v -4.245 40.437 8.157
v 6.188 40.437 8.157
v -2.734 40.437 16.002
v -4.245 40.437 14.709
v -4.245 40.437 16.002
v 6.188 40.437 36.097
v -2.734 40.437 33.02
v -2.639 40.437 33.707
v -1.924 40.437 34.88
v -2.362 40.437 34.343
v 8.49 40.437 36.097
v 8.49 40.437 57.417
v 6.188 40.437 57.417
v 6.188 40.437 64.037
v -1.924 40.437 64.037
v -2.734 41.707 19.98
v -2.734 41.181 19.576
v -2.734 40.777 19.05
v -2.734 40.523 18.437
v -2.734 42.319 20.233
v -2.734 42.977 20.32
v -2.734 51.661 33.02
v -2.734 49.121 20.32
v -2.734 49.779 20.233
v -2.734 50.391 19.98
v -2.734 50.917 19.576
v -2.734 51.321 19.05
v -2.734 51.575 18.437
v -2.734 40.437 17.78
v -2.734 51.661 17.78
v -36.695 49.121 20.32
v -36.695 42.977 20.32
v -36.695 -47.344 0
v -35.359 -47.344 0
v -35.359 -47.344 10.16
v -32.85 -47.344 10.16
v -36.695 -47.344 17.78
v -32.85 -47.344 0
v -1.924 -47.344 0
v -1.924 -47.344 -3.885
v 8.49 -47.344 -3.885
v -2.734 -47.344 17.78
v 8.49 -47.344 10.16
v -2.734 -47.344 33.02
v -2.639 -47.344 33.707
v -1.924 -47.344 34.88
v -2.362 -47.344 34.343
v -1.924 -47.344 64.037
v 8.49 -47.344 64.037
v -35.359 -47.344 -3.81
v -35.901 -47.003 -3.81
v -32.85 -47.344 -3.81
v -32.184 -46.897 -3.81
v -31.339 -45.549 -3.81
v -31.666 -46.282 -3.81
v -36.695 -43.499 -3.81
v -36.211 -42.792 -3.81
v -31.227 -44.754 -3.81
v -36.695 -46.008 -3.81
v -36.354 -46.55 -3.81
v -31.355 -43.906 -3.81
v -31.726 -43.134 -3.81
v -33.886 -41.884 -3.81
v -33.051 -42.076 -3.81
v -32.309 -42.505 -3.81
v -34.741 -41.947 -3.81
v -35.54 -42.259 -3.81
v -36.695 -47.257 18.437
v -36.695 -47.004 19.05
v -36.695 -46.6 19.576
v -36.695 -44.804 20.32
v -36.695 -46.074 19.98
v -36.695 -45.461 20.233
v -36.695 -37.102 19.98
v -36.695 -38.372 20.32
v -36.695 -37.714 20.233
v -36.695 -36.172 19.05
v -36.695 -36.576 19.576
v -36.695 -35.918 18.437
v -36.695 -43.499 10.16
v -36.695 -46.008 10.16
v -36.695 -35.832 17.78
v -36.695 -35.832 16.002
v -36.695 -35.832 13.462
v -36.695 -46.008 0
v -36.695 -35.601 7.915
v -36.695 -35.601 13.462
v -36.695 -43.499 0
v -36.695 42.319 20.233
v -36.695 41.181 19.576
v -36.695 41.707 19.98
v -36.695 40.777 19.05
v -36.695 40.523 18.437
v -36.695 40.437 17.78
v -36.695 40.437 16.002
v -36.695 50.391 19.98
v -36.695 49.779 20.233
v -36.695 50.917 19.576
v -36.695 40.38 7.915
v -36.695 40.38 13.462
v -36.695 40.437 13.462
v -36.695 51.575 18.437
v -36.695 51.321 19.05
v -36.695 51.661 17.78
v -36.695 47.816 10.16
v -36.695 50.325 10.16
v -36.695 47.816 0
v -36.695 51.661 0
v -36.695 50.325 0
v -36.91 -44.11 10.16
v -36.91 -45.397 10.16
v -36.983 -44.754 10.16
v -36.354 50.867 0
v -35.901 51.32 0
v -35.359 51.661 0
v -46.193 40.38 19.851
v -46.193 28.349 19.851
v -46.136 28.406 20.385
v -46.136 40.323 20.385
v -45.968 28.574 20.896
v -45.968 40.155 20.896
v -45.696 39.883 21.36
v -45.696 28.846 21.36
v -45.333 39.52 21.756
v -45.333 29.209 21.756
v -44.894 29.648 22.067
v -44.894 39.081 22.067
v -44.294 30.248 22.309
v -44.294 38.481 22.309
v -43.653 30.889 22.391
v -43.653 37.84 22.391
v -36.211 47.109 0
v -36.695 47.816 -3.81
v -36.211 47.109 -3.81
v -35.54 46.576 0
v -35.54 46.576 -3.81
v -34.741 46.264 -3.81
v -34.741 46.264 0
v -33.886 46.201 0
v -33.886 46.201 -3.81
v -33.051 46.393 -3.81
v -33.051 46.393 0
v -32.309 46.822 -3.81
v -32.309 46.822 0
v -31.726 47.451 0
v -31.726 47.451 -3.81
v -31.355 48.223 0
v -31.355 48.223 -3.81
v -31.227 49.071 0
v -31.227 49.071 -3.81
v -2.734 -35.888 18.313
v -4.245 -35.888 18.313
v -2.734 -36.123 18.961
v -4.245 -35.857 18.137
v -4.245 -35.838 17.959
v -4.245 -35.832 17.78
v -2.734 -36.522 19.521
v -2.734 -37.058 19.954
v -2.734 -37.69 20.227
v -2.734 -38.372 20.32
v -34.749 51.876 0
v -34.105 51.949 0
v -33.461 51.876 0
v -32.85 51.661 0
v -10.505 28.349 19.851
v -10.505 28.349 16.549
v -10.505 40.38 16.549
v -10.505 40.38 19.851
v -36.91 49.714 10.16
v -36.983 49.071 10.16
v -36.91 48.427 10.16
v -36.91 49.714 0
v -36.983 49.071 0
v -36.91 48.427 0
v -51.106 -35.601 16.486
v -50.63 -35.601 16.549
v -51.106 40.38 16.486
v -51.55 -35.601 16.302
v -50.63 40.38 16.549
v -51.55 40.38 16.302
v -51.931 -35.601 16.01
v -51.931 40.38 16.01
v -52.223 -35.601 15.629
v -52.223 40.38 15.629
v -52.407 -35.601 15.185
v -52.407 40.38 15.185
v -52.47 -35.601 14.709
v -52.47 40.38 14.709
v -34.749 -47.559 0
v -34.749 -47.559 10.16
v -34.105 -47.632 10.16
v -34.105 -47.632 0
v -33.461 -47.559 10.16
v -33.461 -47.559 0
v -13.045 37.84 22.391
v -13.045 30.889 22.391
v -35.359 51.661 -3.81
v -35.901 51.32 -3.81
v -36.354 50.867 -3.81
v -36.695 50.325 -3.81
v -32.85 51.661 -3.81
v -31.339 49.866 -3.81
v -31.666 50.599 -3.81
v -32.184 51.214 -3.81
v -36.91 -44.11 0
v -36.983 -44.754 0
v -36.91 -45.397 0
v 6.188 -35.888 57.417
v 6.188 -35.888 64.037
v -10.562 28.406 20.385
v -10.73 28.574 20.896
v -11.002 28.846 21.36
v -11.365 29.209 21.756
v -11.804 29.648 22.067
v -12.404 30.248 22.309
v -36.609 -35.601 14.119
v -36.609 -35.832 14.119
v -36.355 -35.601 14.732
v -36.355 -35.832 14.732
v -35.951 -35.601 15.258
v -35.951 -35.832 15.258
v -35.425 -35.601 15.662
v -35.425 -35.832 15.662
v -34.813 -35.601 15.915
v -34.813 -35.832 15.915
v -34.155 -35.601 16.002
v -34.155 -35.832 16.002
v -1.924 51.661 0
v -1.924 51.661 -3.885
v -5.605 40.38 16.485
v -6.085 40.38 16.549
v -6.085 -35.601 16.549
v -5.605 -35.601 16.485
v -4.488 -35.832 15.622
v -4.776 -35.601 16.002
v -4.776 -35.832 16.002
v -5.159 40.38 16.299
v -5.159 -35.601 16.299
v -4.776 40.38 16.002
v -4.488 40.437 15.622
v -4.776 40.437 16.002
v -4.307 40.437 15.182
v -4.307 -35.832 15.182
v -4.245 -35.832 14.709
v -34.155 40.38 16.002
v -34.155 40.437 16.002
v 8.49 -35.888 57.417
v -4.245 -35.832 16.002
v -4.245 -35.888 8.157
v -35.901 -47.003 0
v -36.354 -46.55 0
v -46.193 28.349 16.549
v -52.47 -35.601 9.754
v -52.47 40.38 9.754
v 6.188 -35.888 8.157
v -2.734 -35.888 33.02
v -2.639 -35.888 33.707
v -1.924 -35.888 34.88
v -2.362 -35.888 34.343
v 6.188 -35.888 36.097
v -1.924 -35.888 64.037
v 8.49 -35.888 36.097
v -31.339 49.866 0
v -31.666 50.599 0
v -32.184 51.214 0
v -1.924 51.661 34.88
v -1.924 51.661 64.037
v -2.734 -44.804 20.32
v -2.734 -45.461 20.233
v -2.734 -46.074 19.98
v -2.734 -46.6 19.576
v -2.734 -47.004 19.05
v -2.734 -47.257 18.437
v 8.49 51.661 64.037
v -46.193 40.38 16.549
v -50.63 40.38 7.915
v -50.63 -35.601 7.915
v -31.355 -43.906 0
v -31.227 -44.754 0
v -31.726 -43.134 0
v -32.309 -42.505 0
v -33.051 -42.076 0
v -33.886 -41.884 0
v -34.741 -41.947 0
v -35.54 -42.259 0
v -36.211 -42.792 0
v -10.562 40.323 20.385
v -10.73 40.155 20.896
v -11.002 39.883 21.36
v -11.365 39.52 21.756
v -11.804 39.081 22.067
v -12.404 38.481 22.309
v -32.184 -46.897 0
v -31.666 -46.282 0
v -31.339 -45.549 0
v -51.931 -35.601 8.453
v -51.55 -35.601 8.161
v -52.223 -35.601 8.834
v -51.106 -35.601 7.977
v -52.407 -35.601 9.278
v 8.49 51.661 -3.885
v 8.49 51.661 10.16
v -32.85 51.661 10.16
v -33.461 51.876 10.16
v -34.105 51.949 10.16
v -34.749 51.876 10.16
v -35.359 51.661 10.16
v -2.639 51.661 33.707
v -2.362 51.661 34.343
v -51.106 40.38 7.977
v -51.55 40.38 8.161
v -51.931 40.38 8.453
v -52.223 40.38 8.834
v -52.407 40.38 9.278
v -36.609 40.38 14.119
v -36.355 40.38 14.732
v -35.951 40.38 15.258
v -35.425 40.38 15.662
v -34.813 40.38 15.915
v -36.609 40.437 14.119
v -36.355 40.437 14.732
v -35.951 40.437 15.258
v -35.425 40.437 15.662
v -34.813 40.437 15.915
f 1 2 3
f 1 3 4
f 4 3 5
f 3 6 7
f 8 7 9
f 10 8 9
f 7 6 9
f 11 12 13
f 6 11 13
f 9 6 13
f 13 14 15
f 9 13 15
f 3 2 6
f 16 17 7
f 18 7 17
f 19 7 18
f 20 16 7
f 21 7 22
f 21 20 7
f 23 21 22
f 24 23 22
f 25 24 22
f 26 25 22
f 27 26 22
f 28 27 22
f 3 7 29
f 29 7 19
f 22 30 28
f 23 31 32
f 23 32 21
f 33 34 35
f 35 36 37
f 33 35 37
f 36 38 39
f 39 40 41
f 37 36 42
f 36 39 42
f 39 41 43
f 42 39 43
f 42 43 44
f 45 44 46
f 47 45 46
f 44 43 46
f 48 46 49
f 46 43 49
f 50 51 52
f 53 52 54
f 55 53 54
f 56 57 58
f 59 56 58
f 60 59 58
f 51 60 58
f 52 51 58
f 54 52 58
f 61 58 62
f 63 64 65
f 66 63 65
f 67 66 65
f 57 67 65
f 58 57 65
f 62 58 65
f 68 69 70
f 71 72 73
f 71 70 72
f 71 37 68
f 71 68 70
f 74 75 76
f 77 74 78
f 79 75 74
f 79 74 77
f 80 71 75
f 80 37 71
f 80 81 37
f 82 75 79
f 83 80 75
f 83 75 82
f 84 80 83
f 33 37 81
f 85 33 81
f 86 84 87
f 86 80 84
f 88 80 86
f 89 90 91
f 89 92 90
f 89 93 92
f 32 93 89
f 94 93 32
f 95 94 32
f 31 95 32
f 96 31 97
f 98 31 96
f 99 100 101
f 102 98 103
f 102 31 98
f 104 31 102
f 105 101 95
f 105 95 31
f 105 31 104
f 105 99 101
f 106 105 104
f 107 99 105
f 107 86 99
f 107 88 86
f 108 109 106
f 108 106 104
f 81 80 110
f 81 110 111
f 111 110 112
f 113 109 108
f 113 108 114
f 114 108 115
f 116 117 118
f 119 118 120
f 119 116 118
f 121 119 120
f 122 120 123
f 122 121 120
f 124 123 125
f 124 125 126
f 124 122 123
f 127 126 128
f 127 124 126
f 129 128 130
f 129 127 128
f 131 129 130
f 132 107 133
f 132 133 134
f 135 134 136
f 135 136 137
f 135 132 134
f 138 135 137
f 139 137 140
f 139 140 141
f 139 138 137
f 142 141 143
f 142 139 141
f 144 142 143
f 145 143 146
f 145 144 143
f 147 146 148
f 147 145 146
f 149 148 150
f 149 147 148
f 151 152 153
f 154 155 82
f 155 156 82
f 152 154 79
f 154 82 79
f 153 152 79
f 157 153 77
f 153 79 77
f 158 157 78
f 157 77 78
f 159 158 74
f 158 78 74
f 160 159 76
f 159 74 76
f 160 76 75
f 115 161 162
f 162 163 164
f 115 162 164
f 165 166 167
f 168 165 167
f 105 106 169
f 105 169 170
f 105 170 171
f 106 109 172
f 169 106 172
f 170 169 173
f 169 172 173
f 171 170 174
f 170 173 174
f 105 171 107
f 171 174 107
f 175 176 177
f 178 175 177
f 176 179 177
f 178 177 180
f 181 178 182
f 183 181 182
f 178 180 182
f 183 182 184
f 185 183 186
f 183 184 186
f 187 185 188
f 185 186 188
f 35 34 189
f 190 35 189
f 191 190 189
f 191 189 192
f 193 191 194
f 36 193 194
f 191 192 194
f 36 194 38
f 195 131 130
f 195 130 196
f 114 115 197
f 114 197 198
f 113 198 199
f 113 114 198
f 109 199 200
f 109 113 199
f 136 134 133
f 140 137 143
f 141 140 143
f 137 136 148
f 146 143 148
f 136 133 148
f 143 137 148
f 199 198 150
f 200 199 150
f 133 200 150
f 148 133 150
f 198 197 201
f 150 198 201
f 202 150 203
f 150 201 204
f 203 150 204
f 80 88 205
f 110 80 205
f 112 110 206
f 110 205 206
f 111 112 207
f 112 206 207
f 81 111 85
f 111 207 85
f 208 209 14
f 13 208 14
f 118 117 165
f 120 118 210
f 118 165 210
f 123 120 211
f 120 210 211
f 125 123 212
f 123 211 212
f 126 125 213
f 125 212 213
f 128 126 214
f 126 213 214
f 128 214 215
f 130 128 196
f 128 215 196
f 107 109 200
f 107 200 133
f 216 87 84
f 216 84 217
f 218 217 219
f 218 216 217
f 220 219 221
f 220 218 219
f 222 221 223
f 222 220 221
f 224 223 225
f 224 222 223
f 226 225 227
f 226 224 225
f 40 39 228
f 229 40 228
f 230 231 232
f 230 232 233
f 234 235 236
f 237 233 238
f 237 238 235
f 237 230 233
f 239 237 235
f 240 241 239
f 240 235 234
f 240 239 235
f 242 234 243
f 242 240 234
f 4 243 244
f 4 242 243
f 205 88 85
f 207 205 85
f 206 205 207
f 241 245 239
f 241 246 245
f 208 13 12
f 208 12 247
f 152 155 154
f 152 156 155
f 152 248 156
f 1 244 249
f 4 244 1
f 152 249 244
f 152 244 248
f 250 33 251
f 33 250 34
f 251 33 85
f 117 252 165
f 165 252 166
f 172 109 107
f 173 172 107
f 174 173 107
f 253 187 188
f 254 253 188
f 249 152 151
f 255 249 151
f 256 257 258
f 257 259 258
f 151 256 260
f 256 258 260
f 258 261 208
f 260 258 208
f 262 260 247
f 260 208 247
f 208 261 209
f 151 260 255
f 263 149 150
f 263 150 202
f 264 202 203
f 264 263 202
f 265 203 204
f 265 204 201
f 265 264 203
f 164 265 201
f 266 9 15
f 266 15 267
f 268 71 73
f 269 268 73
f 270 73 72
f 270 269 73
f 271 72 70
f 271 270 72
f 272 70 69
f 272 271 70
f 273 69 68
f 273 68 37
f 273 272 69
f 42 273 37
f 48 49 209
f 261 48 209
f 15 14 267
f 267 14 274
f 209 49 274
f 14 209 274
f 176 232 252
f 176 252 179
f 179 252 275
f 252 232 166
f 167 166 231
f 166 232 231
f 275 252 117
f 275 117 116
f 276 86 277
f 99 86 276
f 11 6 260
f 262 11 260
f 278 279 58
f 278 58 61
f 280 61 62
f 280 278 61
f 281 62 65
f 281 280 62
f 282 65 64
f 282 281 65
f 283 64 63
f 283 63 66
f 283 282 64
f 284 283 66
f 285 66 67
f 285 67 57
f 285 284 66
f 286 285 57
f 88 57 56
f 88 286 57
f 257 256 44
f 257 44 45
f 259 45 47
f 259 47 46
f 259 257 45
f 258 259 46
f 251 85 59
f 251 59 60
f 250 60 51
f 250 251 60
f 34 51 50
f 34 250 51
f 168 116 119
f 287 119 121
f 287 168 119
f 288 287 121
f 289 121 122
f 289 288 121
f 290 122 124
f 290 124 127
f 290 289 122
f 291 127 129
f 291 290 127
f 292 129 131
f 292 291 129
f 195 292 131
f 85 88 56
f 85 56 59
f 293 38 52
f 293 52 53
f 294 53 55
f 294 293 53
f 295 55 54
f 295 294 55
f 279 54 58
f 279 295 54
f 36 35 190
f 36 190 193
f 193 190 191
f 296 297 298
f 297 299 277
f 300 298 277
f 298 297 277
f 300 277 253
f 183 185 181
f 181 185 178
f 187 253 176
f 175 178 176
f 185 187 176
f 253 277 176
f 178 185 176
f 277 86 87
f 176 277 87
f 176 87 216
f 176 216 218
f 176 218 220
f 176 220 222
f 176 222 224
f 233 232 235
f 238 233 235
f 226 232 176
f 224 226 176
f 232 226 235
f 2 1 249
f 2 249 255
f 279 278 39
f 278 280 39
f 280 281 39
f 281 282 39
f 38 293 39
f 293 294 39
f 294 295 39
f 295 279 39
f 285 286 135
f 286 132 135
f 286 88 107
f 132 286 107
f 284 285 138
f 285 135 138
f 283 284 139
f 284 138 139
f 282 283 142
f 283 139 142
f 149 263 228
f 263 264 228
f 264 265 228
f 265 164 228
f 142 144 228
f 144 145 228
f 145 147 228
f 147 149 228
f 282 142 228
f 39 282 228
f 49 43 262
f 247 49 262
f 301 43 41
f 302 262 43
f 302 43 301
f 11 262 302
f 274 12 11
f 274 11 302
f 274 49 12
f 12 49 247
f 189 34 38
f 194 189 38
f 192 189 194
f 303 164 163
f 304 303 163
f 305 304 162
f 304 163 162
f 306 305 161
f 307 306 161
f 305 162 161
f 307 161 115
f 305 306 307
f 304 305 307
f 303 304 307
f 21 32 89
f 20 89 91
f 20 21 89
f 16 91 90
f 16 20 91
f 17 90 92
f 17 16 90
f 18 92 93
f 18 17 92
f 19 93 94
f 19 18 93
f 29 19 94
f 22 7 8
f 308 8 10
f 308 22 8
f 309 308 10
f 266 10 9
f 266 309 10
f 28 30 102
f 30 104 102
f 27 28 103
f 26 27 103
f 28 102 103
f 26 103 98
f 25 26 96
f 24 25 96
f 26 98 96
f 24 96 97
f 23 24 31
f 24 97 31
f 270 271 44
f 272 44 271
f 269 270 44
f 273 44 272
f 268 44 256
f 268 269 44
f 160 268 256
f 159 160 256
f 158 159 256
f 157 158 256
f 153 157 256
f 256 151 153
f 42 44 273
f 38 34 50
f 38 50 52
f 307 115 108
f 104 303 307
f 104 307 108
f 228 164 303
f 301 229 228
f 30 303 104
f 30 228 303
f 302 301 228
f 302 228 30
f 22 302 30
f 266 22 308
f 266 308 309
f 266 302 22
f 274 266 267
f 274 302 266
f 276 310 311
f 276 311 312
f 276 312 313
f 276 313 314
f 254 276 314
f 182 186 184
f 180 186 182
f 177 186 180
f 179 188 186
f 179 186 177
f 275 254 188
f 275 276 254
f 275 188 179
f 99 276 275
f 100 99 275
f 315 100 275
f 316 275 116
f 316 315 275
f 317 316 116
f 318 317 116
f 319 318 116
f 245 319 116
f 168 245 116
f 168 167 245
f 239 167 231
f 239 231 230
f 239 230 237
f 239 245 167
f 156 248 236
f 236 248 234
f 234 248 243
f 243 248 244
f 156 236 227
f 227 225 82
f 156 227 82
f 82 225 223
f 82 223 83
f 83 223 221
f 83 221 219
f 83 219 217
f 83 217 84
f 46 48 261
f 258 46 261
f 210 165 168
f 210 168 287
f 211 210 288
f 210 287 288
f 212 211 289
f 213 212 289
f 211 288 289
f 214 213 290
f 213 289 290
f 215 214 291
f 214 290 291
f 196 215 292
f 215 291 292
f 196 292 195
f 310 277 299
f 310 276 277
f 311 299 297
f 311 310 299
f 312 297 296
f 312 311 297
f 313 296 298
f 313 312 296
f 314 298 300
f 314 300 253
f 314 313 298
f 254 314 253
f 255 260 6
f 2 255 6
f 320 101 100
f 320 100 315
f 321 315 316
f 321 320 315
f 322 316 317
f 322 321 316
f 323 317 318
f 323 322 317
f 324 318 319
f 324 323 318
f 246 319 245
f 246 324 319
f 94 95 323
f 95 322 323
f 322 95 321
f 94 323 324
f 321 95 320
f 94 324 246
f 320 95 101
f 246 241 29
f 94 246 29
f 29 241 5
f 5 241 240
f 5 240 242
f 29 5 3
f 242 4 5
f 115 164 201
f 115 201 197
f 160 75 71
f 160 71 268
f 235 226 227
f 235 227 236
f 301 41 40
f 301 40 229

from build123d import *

# Parameters (mm, degrees)
F0_W         = 22.5927522406
F0_H         = 49.5025906712
F1_DEPTH     = 10.16
F2_DEPTH     = 3.81
F3_W         = 11.2244246993
F3_H         = 99.0051813424
F4_DEPTH     = 25.4
F6_DEPTH     = 10.16
F7_R         = 2.54
F8_W         = 33.9610797819
F8_H         = 38.1342638284
F8_H_2       = 37.1269418392
F9_DEPTH     = 5.842
F10_R        = 2.54
F11_W        = 99.0051813424
F11_H        = 67.9221570026
F11_W_2      = 75.9807229042
F11_H_2      = 8.63417238
F12_DEPTH    = 10.414
F13_W        = 19.139082171
F13_H        = 29.1566260799
F13_W_2      = 6.5123029053
F13_H_2      = 0.8140355349
F13_W_3      = 18.2694643736
F13_W_4      = 7.5298482552
F13_W_5      = 18.2365168585
F13_W_6      = 7.1228295565
F13_W_7      = 18.1018151343
F13_W_8      = 7.1228314191
F14_DEPTH    = 0.254
F15_DEPTH    = 1.524
F16_DEPTH    = 60.96
F17_W        = 8.1115535974
F17_H        = 76.3251371682
F17_W_2      = 2.3215521545
F18_DEPTH    = 55.88
F19_R        = 1.8396307345
F20_T4_DEPTH = 85.1788765768
F21_W        = 35.6879150495
F21_H        = 12.0312273502
F22_DEPTH    = 5.842
F23_R        = 2.54
F24_W        = 76.3251371682
F24_H        = 21.320472064
F25_DEPTH    = 25.4


# Not quite as in the source:
# - a fillet or chamfer that OpenCascade refuses, or shapes differently, is made with other operations: its cross-section is extruded or revolved along the edge and cut away or added
# - a feature names something its author has since deleted; it is built from what else it names


with BuildPart() as f1:
    # F0 (on Top) → F1 (new body)
    with BuildSketch(Plane.XY):
        with BuildLine():
            Line((-35.3594812499, 51.6611337662), (-36.6952344775, 51.6611337662))
            Line((-36.6952344775, 51.6611337662), (-36.6952344775, 50.3253805386))
            ThreePointArc((-36.6952344775, 50.3253805386), (-36.1400711383, 51.105970427), (-35.3594812499, 51.6611337662))
        make_face()
        with BuildLine():
            ThreePointArc((-32.8504798068, 51.6611337662), (-34.1049805284, 51.9489325583), (-35.3594812499, 51.6611337662))
            Line((-35.3594812499, 51.6611337662), (-32.8504798068, 51.6611337662))
        make_face()
        with BuildLine():
            Line((-32.8504798068, 51.6611337662), (-35.3594812499, 51.6611337662))
            ThreePointArc((-35.3594812499, 51.6611337662), (-36.1400711383, 51.105970427), (-36.6952344775, 50.3253805386))
            Line((-36.6952344775, 50.3253805386), (-36.6952344775, 47.8163790954))
            ThreePointArc((-36.6952344775, 47.8163790954), (-33.4614356183, 46.2656993361), (-31.2269277871, 49.070879817))
            ThreePointArc((-31.2269277871, 49.070879817), (-31.6663634179, 50.5993869876), (-32.8504798068, 51.6611337662))
        make_face()
        with BuildLine():
            Line((-36.6952344775, 47.8163790954), (-36.6952344775, 50.3253805386))
            ThreePointArc((-36.6952344775, 50.3253805386), (-36.9830332696, 49.070879817), (-36.6952344775, 47.8163790954))
        make_face()
        with BuildLine():
            Line((-14.1024822369, 51.6611337662), (-32.8504798068, 51.6611337662))
            ThreePointArc((-32.8504798068, 51.6611337662), (-31.6663634179, 50.5993869876), (-31.2269277871, 49.070879817))
            ThreePointArc((-31.2269277871, 49.070879817), (-33.4614356183, 46.2656993361), (-36.6952344775, 47.8163790954))
            Line((-36.6952344775, 47.8163790954), (-36.6952344775, 2.158543095))
            Line((-36.6952344775, 2.158543095), (-14.1024822369, 2.158543095))
            Line((-14.1024822369, 2.158543095), (-14.1024822369, 51.6611337662))
        make_face()
        with Locations((-2.8061061166, 26.9098384306)):
            Rectangle(F0_W, F0_H)
        with BuildLine():
            Line((-14.1024822369, 2.158543095), (-36.6952344775, 2.158543095))
            Line((-36.6952344775, 2.158543095), (-36.6952344775, -43.4992929054))
            ThreePointArc((-36.6952344775, -43.4992929054), (-33.4614356183, -41.9486131461), (-31.2269277871, -44.753793627))
            ThreePointArc((-31.2269277871, -44.753793627), (-31.6663634179, -46.2823007976), (-32.8504798068, -47.3440475762))
            Line((-32.8504798068, -47.3440475762), (-14.1024822369, -47.3440475762))
            Line((-14.1024822369, -47.3440475762), (-14.1024822369, 2.158543095))
        make_face()
        with Locations((-2.8061061166, -22.5927522406)):
            Rectangle(F0_W, F0_H)
        with BuildLine():
            ThreePointArc((-31.2269277871, -44.753793627), (-33.4614356183, -41.9486131461), (-36.6952344775, -43.4992929054))
            Line((-36.6952344775, -43.4992929054), (-36.6952344775, -46.0082943486))
            ThreePointArc((-36.6952344775, -46.0082943486), (-36.1400711383, -46.788884237), (-35.3594812499, -47.3440475762))
            Line((-35.3594812499, -47.3440475762), (-32.8504798068, -47.3440475762))
            ThreePointArc((-32.8504798068, -47.3440475762), (-31.6663634179, -46.2823007976), (-31.2269277871, -44.753793627))
        make_face()
        with BuildLine():
            Line((-36.6952344775, -46.0082943486), (-36.6952344775, -43.4992929054))
            ThreePointArc((-36.6952344775, -43.4992929054), (-36.9830332696, -44.753793627), (-36.6952344775, -46.0082943486))
        make_face()
        with BuildLine():
            ThreePointArc((-35.3594812499, -47.3440475762), (-36.1400711383, -46.788884237), (-36.6952344775, -46.0082943486))
            Line((-36.6952344775, -46.0082943486), (-36.6952344775, -47.3440475762))
            Line((-36.6952344775, -47.3440475762), (-35.3594812499, -47.3440475762))
        make_face()
        with BuildLine():
            ThreePointArc((-35.3594812499, -47.3440475762), (-34.1049805284, -47.6318463683), (-32.8504798068, -47.3440475762))
            Line((-32.8504798068, -47.3440475762), (-35.3594812499, -47.3440475762))
        make_face()
    extrude(amount=F1_DEPTH)

    # F0 (on Top) → F2 (join)
    with BuildSketch(Plane.XY):
        with BuildLine():
            Line((-32.8504798068, 51.6611337662), (-35.3594812499, 51.6611337662))
            ThreePointArc((-35.3594812499, 51.6611337662), (-36.1400711383, 51.105970427), (-36.6952344775, 50.3253805386))
            Line((-36.6952344775, 50.3253805386), (-36.6952344775, 47.8163790954))
            ThreePointArc((-36.6952344775, 47.8163790954), (-33.4614356183, 46.2656993361), (-31.2269277871, 49.070879817))
            ThreePointArc((-31.2269277871, 49.070879817), (-31.6663634179, 50.5993869876), (-32.8504798068, 51.6611337662))
        make_face()
        with BuildLine():
            ThreePointArc((-31.2269277871, -44.753793627), (-33.4614356183, -41.9486131461), (-36.6952344775, -43.4992929054))
            Line((-36.6952344775, -43.4992929054), (-36.6952344775, -46.0082943486))
            ThreePointArc((-36.6952344775, -46.0082943486), (-36.1400711383, -46.788884237), (-35.3594812499, -47.3440475762))
            Line((-35.3594812499, -47.3440475762), (-32.8504798068, -47.3440475762))
            ThreePointArc((-32.8504798068, -47.3440475762), (-31.6663634179, -46.2823007976), (-31.2269277871, -44.753793627))
        make_face()
    extrude(amount=-F2_DEPTH)

    # F3 (on face) → F4 (join)
    with BuildSketch(Plane.XY.offset(10.16)):
        with Locations((2.878057654, 2.158543095)):
            Rectangle(F3_W, F3_H)
    extrude(amount=F4_DEPTH)

    # F5 (on face) → F6 (join)
    with BuildSketch(Plane.XY.offset(10.16)):
        Polygon((-2.7341546956, 40.4367111623), (-2.7341546956, 51.6611337662), (-32.8504798068, 51.6611337662), (-35.3594812499, 51.6611337662), (-36.6952344775, 51.6611337662), (-36.6952344775, 50.3253805386), (-36.6952344775, 47.8163790954), (-36.6952344775, 40.4367111623), align=None)
        Polygon((-2.7341546956, -47.3440475762), (-2.7341546956, -35.8318164945), (-36.6952344775, -35.8318164945), (-36.6952344775, -43.4992929054), (-36.6952344775, -46.0082943486), (-36.6952344775, -47.3440475762), (-35.3594812499, -47.3440475762), (-32.8504798068, -47.3440475762), align=None)
    extrude(amount=F6_DEPTH)

    # F7
    f7_edges = [f1.edges().sort_by_distance(p)[0] for p in [
        (-2.734155, 2.158543, 35.56),
        (-19.714695, -35.831816, 20.32),
        (-19.714695, -47.344048, 20.32),
        (-19.714695, 51.661134, 20.32),
        (-19.714695, 40.436711, 20.32),
    ]]
    fillet(f7_edges, radius=F7_R)

    # F8 (on face) → F9 (join)
    with BuildSketch(Plane.XY.offset(10.16)):
        with Locations((-19.7146945866, 21.3695792481)):
            Rectangle(F8_W, F8_H)
        with Locations((-19.7146945866, -17.2683455748)):
            Rectangle(F8_W, F8_H_2)
    extrude(amount=F9_DEPTH)

    # F10
    f10_edges = [f1.edges().sort_by_distance(p)[0] for p in [
        (-19.714695, 1.295125, 16.002),
        (-19.714695, 2.302447, 16.002),
        (-36.695234, -17.268346, 16.002),
        (-36.695234, 21.369579, 16.002),
    ]]
    fillet(f10_edges, radius=F10_R)

    # F11 (on face) → F12 (join)
    with BuildSketch(Plane.YZ.offset(8.4902700037)):
        with Locations((2.158543095, 30.0757006044)):
            Rectangle(F11_W, F11_H)
        with Locations((2.3897327483, 12.2317448258)):
            Rectangle(F11_W_2, F11_H_2, mode=Mode.SUBTRACT)
    extrude(amount=-F12_DEPTH)

    # F13 (on face) → F14 (join)
    with BuildSketch(Plane(origin=(-1.9237299963, 0, 0), x_dir=(0, -1, 0), z_dir=(-1, 0, 0))):
        with Locations((-30.8671663515, 49.4584660657)):
            Rectangle(F13_W, F13_H)
        with Locations((-30.3225759417, 61.080571264)):
            Rectangle(F13_W_2, F13_H_2, mode=Mode.SUBTRACT)
        with Locations((-11.2932752818, 49.4584660657)):
            Rectangle(F13_W_3, F13_H)
        with Locations((-11.4979553036, 61.080571264)):
            Rectangle(F13_W_4, F13_H_2, mode=Mode.SUBTRACT)
        with Locations((7.7183801332, 49.4584660657)):
            Rectangle(F13_W_5, F13_H)
        with Locations((7.9371919855, 61.080571264)):
            Rectangle(F13_W_6, F13_H_2, mode=Mode.SUBTRACT)
        with Locations((26.7809126526, 49.4584660657)):
            Rectangle(F13_W_7, F13_H)
        with Locations((27.0670773461, 61.080571264)):
            Rectangle(F13_W_8, F13_H_2, mode=Mode.SUBTRACT)
    extrude(amount=F14_DEPTH)

    # F13 (on face) → F15 (join)
    with BuildSketch(Plane(origin=(-1.9237299963, 0, 0), x_dir=(0, -1, 0), z_dir=(-1, 0, 0))):
        with Locations((27.0670773461, 61.080571264)):
            Rectangle(F13_W_8, F13_H_2)
        with Locations((7.9371919855, 61.080571264)):
            Rectangle(F13_W_6, F13_H_2)
        with Locations((-11.4979553036, 61.080571264)):
            Rectangle(F13_W_4, F13_H_2)
        with Locations((-30.3225759417, 61.080571264)):
            Rectangle(F13_W_2, F13_H_2)
    extrude(amount=F15_DEPTH)

    # F11 (on face) → F16 (join)
    with BuildSketch(Plane.YZ.offset(8.4902700037)):
        with Locations((2.3897327483, 12.2317448258)):
            Rectangle(F11_W_2, F11_H_2)
    extrude(amount=-F16_DEPTH)

    # F17 (on face) → F18 (cut)
    with BuildSketch(Plane.XY.offset(64.0367791057)):
        with Locations((2.1320468024, 2.274138853)):
            Rectangle(F17_W, F17_H)
        with Locations((-3.0845060736, 2.274138853)):
            Rectangle(F17_W_2, F17_H)
    extrude(amount=-F18_DEPTH, mode=Mode.SUBTRACT)

    # F19
    f19_edges = [f1.edges().sort_by_distance(p)[0] for p in [
        (-52.46973, 2.389733, 16.548831),
        (-52.46973, 2.389733, 7.914659),
    ]]
    fillet(f19_edges, radius=F19_R)

    # F20: fillet of radius 1.8396307345 on 1 edges, made by hand


with BuildPart() as f20_tool2:
    # F20_s3 → F20_t4 (new body)
    with BuildSketch(Plane.XZ.offset(-44.9791710367)):
        with BuildLine():
            ThreePointArc((-6.0849128853, 16.5488310158), (-4.7840975181, 16.0100156486), (-4.2452821508, 14.7092002813))
            Line((-4.2452821508, 14.7092002813), (-4.2452821508, 16.5488310158))
            Line((-4.2452821508, 16.5488310158), (-6.0849128853, 16.5488310158))
        make_face()
    extrude(amount=F20_T4_DEPTH)

    split(bisect_by=Plane.XZ.offset(-40.4367111623), keep=Keep.TOP)

    split(bisect_by=Plane.XZ.offset(35.8318164945), keep=Keep.BOTTOM)


with BuildPart() as f1_1:
    add(f1.part)

    # F20_t1: cut F20_tool2
    add(f20_tool2.part, mode=Mode.SUBTRACT)

    # F21 (on face) → F22 (join)
    with BuildSketch(Plane.XY.offset(16.5488310158)):
        with Locations((-28.3488673158, 34.3644805253)):
            Rectangle(F21_W, F21_H)
    extrude(amount=F22_DEPTH)

    # F23
    f23_edges = [f1_1.edges().sort_by_distance(p)[0] for p in [
        (-10.50491, 34.364481, 22.390831),
        (-28.348867, 28.348867, 22.390831),
        (-46.192825, 34.364481, 22.390831),
        (-28.348867, 40.380094, 22.390831),
    ]]
    fillet(f23_edges, radius=F23_R)

    # F24 (on face) → F25 (cut)
    with BuildSketch(Plane(origin=(6.1878236011, 0, 0), x_dir=(0, -1, 0), z_dir=(-1, 0, 0))):
        with Locations((-2.274138853, 46.7570151377)):
            Rectangle(F24_W, F24_H)
    extrude(amount=-F25_DEPTH, mode=Mode.SUBTRACT)


solid = f1_1.part
